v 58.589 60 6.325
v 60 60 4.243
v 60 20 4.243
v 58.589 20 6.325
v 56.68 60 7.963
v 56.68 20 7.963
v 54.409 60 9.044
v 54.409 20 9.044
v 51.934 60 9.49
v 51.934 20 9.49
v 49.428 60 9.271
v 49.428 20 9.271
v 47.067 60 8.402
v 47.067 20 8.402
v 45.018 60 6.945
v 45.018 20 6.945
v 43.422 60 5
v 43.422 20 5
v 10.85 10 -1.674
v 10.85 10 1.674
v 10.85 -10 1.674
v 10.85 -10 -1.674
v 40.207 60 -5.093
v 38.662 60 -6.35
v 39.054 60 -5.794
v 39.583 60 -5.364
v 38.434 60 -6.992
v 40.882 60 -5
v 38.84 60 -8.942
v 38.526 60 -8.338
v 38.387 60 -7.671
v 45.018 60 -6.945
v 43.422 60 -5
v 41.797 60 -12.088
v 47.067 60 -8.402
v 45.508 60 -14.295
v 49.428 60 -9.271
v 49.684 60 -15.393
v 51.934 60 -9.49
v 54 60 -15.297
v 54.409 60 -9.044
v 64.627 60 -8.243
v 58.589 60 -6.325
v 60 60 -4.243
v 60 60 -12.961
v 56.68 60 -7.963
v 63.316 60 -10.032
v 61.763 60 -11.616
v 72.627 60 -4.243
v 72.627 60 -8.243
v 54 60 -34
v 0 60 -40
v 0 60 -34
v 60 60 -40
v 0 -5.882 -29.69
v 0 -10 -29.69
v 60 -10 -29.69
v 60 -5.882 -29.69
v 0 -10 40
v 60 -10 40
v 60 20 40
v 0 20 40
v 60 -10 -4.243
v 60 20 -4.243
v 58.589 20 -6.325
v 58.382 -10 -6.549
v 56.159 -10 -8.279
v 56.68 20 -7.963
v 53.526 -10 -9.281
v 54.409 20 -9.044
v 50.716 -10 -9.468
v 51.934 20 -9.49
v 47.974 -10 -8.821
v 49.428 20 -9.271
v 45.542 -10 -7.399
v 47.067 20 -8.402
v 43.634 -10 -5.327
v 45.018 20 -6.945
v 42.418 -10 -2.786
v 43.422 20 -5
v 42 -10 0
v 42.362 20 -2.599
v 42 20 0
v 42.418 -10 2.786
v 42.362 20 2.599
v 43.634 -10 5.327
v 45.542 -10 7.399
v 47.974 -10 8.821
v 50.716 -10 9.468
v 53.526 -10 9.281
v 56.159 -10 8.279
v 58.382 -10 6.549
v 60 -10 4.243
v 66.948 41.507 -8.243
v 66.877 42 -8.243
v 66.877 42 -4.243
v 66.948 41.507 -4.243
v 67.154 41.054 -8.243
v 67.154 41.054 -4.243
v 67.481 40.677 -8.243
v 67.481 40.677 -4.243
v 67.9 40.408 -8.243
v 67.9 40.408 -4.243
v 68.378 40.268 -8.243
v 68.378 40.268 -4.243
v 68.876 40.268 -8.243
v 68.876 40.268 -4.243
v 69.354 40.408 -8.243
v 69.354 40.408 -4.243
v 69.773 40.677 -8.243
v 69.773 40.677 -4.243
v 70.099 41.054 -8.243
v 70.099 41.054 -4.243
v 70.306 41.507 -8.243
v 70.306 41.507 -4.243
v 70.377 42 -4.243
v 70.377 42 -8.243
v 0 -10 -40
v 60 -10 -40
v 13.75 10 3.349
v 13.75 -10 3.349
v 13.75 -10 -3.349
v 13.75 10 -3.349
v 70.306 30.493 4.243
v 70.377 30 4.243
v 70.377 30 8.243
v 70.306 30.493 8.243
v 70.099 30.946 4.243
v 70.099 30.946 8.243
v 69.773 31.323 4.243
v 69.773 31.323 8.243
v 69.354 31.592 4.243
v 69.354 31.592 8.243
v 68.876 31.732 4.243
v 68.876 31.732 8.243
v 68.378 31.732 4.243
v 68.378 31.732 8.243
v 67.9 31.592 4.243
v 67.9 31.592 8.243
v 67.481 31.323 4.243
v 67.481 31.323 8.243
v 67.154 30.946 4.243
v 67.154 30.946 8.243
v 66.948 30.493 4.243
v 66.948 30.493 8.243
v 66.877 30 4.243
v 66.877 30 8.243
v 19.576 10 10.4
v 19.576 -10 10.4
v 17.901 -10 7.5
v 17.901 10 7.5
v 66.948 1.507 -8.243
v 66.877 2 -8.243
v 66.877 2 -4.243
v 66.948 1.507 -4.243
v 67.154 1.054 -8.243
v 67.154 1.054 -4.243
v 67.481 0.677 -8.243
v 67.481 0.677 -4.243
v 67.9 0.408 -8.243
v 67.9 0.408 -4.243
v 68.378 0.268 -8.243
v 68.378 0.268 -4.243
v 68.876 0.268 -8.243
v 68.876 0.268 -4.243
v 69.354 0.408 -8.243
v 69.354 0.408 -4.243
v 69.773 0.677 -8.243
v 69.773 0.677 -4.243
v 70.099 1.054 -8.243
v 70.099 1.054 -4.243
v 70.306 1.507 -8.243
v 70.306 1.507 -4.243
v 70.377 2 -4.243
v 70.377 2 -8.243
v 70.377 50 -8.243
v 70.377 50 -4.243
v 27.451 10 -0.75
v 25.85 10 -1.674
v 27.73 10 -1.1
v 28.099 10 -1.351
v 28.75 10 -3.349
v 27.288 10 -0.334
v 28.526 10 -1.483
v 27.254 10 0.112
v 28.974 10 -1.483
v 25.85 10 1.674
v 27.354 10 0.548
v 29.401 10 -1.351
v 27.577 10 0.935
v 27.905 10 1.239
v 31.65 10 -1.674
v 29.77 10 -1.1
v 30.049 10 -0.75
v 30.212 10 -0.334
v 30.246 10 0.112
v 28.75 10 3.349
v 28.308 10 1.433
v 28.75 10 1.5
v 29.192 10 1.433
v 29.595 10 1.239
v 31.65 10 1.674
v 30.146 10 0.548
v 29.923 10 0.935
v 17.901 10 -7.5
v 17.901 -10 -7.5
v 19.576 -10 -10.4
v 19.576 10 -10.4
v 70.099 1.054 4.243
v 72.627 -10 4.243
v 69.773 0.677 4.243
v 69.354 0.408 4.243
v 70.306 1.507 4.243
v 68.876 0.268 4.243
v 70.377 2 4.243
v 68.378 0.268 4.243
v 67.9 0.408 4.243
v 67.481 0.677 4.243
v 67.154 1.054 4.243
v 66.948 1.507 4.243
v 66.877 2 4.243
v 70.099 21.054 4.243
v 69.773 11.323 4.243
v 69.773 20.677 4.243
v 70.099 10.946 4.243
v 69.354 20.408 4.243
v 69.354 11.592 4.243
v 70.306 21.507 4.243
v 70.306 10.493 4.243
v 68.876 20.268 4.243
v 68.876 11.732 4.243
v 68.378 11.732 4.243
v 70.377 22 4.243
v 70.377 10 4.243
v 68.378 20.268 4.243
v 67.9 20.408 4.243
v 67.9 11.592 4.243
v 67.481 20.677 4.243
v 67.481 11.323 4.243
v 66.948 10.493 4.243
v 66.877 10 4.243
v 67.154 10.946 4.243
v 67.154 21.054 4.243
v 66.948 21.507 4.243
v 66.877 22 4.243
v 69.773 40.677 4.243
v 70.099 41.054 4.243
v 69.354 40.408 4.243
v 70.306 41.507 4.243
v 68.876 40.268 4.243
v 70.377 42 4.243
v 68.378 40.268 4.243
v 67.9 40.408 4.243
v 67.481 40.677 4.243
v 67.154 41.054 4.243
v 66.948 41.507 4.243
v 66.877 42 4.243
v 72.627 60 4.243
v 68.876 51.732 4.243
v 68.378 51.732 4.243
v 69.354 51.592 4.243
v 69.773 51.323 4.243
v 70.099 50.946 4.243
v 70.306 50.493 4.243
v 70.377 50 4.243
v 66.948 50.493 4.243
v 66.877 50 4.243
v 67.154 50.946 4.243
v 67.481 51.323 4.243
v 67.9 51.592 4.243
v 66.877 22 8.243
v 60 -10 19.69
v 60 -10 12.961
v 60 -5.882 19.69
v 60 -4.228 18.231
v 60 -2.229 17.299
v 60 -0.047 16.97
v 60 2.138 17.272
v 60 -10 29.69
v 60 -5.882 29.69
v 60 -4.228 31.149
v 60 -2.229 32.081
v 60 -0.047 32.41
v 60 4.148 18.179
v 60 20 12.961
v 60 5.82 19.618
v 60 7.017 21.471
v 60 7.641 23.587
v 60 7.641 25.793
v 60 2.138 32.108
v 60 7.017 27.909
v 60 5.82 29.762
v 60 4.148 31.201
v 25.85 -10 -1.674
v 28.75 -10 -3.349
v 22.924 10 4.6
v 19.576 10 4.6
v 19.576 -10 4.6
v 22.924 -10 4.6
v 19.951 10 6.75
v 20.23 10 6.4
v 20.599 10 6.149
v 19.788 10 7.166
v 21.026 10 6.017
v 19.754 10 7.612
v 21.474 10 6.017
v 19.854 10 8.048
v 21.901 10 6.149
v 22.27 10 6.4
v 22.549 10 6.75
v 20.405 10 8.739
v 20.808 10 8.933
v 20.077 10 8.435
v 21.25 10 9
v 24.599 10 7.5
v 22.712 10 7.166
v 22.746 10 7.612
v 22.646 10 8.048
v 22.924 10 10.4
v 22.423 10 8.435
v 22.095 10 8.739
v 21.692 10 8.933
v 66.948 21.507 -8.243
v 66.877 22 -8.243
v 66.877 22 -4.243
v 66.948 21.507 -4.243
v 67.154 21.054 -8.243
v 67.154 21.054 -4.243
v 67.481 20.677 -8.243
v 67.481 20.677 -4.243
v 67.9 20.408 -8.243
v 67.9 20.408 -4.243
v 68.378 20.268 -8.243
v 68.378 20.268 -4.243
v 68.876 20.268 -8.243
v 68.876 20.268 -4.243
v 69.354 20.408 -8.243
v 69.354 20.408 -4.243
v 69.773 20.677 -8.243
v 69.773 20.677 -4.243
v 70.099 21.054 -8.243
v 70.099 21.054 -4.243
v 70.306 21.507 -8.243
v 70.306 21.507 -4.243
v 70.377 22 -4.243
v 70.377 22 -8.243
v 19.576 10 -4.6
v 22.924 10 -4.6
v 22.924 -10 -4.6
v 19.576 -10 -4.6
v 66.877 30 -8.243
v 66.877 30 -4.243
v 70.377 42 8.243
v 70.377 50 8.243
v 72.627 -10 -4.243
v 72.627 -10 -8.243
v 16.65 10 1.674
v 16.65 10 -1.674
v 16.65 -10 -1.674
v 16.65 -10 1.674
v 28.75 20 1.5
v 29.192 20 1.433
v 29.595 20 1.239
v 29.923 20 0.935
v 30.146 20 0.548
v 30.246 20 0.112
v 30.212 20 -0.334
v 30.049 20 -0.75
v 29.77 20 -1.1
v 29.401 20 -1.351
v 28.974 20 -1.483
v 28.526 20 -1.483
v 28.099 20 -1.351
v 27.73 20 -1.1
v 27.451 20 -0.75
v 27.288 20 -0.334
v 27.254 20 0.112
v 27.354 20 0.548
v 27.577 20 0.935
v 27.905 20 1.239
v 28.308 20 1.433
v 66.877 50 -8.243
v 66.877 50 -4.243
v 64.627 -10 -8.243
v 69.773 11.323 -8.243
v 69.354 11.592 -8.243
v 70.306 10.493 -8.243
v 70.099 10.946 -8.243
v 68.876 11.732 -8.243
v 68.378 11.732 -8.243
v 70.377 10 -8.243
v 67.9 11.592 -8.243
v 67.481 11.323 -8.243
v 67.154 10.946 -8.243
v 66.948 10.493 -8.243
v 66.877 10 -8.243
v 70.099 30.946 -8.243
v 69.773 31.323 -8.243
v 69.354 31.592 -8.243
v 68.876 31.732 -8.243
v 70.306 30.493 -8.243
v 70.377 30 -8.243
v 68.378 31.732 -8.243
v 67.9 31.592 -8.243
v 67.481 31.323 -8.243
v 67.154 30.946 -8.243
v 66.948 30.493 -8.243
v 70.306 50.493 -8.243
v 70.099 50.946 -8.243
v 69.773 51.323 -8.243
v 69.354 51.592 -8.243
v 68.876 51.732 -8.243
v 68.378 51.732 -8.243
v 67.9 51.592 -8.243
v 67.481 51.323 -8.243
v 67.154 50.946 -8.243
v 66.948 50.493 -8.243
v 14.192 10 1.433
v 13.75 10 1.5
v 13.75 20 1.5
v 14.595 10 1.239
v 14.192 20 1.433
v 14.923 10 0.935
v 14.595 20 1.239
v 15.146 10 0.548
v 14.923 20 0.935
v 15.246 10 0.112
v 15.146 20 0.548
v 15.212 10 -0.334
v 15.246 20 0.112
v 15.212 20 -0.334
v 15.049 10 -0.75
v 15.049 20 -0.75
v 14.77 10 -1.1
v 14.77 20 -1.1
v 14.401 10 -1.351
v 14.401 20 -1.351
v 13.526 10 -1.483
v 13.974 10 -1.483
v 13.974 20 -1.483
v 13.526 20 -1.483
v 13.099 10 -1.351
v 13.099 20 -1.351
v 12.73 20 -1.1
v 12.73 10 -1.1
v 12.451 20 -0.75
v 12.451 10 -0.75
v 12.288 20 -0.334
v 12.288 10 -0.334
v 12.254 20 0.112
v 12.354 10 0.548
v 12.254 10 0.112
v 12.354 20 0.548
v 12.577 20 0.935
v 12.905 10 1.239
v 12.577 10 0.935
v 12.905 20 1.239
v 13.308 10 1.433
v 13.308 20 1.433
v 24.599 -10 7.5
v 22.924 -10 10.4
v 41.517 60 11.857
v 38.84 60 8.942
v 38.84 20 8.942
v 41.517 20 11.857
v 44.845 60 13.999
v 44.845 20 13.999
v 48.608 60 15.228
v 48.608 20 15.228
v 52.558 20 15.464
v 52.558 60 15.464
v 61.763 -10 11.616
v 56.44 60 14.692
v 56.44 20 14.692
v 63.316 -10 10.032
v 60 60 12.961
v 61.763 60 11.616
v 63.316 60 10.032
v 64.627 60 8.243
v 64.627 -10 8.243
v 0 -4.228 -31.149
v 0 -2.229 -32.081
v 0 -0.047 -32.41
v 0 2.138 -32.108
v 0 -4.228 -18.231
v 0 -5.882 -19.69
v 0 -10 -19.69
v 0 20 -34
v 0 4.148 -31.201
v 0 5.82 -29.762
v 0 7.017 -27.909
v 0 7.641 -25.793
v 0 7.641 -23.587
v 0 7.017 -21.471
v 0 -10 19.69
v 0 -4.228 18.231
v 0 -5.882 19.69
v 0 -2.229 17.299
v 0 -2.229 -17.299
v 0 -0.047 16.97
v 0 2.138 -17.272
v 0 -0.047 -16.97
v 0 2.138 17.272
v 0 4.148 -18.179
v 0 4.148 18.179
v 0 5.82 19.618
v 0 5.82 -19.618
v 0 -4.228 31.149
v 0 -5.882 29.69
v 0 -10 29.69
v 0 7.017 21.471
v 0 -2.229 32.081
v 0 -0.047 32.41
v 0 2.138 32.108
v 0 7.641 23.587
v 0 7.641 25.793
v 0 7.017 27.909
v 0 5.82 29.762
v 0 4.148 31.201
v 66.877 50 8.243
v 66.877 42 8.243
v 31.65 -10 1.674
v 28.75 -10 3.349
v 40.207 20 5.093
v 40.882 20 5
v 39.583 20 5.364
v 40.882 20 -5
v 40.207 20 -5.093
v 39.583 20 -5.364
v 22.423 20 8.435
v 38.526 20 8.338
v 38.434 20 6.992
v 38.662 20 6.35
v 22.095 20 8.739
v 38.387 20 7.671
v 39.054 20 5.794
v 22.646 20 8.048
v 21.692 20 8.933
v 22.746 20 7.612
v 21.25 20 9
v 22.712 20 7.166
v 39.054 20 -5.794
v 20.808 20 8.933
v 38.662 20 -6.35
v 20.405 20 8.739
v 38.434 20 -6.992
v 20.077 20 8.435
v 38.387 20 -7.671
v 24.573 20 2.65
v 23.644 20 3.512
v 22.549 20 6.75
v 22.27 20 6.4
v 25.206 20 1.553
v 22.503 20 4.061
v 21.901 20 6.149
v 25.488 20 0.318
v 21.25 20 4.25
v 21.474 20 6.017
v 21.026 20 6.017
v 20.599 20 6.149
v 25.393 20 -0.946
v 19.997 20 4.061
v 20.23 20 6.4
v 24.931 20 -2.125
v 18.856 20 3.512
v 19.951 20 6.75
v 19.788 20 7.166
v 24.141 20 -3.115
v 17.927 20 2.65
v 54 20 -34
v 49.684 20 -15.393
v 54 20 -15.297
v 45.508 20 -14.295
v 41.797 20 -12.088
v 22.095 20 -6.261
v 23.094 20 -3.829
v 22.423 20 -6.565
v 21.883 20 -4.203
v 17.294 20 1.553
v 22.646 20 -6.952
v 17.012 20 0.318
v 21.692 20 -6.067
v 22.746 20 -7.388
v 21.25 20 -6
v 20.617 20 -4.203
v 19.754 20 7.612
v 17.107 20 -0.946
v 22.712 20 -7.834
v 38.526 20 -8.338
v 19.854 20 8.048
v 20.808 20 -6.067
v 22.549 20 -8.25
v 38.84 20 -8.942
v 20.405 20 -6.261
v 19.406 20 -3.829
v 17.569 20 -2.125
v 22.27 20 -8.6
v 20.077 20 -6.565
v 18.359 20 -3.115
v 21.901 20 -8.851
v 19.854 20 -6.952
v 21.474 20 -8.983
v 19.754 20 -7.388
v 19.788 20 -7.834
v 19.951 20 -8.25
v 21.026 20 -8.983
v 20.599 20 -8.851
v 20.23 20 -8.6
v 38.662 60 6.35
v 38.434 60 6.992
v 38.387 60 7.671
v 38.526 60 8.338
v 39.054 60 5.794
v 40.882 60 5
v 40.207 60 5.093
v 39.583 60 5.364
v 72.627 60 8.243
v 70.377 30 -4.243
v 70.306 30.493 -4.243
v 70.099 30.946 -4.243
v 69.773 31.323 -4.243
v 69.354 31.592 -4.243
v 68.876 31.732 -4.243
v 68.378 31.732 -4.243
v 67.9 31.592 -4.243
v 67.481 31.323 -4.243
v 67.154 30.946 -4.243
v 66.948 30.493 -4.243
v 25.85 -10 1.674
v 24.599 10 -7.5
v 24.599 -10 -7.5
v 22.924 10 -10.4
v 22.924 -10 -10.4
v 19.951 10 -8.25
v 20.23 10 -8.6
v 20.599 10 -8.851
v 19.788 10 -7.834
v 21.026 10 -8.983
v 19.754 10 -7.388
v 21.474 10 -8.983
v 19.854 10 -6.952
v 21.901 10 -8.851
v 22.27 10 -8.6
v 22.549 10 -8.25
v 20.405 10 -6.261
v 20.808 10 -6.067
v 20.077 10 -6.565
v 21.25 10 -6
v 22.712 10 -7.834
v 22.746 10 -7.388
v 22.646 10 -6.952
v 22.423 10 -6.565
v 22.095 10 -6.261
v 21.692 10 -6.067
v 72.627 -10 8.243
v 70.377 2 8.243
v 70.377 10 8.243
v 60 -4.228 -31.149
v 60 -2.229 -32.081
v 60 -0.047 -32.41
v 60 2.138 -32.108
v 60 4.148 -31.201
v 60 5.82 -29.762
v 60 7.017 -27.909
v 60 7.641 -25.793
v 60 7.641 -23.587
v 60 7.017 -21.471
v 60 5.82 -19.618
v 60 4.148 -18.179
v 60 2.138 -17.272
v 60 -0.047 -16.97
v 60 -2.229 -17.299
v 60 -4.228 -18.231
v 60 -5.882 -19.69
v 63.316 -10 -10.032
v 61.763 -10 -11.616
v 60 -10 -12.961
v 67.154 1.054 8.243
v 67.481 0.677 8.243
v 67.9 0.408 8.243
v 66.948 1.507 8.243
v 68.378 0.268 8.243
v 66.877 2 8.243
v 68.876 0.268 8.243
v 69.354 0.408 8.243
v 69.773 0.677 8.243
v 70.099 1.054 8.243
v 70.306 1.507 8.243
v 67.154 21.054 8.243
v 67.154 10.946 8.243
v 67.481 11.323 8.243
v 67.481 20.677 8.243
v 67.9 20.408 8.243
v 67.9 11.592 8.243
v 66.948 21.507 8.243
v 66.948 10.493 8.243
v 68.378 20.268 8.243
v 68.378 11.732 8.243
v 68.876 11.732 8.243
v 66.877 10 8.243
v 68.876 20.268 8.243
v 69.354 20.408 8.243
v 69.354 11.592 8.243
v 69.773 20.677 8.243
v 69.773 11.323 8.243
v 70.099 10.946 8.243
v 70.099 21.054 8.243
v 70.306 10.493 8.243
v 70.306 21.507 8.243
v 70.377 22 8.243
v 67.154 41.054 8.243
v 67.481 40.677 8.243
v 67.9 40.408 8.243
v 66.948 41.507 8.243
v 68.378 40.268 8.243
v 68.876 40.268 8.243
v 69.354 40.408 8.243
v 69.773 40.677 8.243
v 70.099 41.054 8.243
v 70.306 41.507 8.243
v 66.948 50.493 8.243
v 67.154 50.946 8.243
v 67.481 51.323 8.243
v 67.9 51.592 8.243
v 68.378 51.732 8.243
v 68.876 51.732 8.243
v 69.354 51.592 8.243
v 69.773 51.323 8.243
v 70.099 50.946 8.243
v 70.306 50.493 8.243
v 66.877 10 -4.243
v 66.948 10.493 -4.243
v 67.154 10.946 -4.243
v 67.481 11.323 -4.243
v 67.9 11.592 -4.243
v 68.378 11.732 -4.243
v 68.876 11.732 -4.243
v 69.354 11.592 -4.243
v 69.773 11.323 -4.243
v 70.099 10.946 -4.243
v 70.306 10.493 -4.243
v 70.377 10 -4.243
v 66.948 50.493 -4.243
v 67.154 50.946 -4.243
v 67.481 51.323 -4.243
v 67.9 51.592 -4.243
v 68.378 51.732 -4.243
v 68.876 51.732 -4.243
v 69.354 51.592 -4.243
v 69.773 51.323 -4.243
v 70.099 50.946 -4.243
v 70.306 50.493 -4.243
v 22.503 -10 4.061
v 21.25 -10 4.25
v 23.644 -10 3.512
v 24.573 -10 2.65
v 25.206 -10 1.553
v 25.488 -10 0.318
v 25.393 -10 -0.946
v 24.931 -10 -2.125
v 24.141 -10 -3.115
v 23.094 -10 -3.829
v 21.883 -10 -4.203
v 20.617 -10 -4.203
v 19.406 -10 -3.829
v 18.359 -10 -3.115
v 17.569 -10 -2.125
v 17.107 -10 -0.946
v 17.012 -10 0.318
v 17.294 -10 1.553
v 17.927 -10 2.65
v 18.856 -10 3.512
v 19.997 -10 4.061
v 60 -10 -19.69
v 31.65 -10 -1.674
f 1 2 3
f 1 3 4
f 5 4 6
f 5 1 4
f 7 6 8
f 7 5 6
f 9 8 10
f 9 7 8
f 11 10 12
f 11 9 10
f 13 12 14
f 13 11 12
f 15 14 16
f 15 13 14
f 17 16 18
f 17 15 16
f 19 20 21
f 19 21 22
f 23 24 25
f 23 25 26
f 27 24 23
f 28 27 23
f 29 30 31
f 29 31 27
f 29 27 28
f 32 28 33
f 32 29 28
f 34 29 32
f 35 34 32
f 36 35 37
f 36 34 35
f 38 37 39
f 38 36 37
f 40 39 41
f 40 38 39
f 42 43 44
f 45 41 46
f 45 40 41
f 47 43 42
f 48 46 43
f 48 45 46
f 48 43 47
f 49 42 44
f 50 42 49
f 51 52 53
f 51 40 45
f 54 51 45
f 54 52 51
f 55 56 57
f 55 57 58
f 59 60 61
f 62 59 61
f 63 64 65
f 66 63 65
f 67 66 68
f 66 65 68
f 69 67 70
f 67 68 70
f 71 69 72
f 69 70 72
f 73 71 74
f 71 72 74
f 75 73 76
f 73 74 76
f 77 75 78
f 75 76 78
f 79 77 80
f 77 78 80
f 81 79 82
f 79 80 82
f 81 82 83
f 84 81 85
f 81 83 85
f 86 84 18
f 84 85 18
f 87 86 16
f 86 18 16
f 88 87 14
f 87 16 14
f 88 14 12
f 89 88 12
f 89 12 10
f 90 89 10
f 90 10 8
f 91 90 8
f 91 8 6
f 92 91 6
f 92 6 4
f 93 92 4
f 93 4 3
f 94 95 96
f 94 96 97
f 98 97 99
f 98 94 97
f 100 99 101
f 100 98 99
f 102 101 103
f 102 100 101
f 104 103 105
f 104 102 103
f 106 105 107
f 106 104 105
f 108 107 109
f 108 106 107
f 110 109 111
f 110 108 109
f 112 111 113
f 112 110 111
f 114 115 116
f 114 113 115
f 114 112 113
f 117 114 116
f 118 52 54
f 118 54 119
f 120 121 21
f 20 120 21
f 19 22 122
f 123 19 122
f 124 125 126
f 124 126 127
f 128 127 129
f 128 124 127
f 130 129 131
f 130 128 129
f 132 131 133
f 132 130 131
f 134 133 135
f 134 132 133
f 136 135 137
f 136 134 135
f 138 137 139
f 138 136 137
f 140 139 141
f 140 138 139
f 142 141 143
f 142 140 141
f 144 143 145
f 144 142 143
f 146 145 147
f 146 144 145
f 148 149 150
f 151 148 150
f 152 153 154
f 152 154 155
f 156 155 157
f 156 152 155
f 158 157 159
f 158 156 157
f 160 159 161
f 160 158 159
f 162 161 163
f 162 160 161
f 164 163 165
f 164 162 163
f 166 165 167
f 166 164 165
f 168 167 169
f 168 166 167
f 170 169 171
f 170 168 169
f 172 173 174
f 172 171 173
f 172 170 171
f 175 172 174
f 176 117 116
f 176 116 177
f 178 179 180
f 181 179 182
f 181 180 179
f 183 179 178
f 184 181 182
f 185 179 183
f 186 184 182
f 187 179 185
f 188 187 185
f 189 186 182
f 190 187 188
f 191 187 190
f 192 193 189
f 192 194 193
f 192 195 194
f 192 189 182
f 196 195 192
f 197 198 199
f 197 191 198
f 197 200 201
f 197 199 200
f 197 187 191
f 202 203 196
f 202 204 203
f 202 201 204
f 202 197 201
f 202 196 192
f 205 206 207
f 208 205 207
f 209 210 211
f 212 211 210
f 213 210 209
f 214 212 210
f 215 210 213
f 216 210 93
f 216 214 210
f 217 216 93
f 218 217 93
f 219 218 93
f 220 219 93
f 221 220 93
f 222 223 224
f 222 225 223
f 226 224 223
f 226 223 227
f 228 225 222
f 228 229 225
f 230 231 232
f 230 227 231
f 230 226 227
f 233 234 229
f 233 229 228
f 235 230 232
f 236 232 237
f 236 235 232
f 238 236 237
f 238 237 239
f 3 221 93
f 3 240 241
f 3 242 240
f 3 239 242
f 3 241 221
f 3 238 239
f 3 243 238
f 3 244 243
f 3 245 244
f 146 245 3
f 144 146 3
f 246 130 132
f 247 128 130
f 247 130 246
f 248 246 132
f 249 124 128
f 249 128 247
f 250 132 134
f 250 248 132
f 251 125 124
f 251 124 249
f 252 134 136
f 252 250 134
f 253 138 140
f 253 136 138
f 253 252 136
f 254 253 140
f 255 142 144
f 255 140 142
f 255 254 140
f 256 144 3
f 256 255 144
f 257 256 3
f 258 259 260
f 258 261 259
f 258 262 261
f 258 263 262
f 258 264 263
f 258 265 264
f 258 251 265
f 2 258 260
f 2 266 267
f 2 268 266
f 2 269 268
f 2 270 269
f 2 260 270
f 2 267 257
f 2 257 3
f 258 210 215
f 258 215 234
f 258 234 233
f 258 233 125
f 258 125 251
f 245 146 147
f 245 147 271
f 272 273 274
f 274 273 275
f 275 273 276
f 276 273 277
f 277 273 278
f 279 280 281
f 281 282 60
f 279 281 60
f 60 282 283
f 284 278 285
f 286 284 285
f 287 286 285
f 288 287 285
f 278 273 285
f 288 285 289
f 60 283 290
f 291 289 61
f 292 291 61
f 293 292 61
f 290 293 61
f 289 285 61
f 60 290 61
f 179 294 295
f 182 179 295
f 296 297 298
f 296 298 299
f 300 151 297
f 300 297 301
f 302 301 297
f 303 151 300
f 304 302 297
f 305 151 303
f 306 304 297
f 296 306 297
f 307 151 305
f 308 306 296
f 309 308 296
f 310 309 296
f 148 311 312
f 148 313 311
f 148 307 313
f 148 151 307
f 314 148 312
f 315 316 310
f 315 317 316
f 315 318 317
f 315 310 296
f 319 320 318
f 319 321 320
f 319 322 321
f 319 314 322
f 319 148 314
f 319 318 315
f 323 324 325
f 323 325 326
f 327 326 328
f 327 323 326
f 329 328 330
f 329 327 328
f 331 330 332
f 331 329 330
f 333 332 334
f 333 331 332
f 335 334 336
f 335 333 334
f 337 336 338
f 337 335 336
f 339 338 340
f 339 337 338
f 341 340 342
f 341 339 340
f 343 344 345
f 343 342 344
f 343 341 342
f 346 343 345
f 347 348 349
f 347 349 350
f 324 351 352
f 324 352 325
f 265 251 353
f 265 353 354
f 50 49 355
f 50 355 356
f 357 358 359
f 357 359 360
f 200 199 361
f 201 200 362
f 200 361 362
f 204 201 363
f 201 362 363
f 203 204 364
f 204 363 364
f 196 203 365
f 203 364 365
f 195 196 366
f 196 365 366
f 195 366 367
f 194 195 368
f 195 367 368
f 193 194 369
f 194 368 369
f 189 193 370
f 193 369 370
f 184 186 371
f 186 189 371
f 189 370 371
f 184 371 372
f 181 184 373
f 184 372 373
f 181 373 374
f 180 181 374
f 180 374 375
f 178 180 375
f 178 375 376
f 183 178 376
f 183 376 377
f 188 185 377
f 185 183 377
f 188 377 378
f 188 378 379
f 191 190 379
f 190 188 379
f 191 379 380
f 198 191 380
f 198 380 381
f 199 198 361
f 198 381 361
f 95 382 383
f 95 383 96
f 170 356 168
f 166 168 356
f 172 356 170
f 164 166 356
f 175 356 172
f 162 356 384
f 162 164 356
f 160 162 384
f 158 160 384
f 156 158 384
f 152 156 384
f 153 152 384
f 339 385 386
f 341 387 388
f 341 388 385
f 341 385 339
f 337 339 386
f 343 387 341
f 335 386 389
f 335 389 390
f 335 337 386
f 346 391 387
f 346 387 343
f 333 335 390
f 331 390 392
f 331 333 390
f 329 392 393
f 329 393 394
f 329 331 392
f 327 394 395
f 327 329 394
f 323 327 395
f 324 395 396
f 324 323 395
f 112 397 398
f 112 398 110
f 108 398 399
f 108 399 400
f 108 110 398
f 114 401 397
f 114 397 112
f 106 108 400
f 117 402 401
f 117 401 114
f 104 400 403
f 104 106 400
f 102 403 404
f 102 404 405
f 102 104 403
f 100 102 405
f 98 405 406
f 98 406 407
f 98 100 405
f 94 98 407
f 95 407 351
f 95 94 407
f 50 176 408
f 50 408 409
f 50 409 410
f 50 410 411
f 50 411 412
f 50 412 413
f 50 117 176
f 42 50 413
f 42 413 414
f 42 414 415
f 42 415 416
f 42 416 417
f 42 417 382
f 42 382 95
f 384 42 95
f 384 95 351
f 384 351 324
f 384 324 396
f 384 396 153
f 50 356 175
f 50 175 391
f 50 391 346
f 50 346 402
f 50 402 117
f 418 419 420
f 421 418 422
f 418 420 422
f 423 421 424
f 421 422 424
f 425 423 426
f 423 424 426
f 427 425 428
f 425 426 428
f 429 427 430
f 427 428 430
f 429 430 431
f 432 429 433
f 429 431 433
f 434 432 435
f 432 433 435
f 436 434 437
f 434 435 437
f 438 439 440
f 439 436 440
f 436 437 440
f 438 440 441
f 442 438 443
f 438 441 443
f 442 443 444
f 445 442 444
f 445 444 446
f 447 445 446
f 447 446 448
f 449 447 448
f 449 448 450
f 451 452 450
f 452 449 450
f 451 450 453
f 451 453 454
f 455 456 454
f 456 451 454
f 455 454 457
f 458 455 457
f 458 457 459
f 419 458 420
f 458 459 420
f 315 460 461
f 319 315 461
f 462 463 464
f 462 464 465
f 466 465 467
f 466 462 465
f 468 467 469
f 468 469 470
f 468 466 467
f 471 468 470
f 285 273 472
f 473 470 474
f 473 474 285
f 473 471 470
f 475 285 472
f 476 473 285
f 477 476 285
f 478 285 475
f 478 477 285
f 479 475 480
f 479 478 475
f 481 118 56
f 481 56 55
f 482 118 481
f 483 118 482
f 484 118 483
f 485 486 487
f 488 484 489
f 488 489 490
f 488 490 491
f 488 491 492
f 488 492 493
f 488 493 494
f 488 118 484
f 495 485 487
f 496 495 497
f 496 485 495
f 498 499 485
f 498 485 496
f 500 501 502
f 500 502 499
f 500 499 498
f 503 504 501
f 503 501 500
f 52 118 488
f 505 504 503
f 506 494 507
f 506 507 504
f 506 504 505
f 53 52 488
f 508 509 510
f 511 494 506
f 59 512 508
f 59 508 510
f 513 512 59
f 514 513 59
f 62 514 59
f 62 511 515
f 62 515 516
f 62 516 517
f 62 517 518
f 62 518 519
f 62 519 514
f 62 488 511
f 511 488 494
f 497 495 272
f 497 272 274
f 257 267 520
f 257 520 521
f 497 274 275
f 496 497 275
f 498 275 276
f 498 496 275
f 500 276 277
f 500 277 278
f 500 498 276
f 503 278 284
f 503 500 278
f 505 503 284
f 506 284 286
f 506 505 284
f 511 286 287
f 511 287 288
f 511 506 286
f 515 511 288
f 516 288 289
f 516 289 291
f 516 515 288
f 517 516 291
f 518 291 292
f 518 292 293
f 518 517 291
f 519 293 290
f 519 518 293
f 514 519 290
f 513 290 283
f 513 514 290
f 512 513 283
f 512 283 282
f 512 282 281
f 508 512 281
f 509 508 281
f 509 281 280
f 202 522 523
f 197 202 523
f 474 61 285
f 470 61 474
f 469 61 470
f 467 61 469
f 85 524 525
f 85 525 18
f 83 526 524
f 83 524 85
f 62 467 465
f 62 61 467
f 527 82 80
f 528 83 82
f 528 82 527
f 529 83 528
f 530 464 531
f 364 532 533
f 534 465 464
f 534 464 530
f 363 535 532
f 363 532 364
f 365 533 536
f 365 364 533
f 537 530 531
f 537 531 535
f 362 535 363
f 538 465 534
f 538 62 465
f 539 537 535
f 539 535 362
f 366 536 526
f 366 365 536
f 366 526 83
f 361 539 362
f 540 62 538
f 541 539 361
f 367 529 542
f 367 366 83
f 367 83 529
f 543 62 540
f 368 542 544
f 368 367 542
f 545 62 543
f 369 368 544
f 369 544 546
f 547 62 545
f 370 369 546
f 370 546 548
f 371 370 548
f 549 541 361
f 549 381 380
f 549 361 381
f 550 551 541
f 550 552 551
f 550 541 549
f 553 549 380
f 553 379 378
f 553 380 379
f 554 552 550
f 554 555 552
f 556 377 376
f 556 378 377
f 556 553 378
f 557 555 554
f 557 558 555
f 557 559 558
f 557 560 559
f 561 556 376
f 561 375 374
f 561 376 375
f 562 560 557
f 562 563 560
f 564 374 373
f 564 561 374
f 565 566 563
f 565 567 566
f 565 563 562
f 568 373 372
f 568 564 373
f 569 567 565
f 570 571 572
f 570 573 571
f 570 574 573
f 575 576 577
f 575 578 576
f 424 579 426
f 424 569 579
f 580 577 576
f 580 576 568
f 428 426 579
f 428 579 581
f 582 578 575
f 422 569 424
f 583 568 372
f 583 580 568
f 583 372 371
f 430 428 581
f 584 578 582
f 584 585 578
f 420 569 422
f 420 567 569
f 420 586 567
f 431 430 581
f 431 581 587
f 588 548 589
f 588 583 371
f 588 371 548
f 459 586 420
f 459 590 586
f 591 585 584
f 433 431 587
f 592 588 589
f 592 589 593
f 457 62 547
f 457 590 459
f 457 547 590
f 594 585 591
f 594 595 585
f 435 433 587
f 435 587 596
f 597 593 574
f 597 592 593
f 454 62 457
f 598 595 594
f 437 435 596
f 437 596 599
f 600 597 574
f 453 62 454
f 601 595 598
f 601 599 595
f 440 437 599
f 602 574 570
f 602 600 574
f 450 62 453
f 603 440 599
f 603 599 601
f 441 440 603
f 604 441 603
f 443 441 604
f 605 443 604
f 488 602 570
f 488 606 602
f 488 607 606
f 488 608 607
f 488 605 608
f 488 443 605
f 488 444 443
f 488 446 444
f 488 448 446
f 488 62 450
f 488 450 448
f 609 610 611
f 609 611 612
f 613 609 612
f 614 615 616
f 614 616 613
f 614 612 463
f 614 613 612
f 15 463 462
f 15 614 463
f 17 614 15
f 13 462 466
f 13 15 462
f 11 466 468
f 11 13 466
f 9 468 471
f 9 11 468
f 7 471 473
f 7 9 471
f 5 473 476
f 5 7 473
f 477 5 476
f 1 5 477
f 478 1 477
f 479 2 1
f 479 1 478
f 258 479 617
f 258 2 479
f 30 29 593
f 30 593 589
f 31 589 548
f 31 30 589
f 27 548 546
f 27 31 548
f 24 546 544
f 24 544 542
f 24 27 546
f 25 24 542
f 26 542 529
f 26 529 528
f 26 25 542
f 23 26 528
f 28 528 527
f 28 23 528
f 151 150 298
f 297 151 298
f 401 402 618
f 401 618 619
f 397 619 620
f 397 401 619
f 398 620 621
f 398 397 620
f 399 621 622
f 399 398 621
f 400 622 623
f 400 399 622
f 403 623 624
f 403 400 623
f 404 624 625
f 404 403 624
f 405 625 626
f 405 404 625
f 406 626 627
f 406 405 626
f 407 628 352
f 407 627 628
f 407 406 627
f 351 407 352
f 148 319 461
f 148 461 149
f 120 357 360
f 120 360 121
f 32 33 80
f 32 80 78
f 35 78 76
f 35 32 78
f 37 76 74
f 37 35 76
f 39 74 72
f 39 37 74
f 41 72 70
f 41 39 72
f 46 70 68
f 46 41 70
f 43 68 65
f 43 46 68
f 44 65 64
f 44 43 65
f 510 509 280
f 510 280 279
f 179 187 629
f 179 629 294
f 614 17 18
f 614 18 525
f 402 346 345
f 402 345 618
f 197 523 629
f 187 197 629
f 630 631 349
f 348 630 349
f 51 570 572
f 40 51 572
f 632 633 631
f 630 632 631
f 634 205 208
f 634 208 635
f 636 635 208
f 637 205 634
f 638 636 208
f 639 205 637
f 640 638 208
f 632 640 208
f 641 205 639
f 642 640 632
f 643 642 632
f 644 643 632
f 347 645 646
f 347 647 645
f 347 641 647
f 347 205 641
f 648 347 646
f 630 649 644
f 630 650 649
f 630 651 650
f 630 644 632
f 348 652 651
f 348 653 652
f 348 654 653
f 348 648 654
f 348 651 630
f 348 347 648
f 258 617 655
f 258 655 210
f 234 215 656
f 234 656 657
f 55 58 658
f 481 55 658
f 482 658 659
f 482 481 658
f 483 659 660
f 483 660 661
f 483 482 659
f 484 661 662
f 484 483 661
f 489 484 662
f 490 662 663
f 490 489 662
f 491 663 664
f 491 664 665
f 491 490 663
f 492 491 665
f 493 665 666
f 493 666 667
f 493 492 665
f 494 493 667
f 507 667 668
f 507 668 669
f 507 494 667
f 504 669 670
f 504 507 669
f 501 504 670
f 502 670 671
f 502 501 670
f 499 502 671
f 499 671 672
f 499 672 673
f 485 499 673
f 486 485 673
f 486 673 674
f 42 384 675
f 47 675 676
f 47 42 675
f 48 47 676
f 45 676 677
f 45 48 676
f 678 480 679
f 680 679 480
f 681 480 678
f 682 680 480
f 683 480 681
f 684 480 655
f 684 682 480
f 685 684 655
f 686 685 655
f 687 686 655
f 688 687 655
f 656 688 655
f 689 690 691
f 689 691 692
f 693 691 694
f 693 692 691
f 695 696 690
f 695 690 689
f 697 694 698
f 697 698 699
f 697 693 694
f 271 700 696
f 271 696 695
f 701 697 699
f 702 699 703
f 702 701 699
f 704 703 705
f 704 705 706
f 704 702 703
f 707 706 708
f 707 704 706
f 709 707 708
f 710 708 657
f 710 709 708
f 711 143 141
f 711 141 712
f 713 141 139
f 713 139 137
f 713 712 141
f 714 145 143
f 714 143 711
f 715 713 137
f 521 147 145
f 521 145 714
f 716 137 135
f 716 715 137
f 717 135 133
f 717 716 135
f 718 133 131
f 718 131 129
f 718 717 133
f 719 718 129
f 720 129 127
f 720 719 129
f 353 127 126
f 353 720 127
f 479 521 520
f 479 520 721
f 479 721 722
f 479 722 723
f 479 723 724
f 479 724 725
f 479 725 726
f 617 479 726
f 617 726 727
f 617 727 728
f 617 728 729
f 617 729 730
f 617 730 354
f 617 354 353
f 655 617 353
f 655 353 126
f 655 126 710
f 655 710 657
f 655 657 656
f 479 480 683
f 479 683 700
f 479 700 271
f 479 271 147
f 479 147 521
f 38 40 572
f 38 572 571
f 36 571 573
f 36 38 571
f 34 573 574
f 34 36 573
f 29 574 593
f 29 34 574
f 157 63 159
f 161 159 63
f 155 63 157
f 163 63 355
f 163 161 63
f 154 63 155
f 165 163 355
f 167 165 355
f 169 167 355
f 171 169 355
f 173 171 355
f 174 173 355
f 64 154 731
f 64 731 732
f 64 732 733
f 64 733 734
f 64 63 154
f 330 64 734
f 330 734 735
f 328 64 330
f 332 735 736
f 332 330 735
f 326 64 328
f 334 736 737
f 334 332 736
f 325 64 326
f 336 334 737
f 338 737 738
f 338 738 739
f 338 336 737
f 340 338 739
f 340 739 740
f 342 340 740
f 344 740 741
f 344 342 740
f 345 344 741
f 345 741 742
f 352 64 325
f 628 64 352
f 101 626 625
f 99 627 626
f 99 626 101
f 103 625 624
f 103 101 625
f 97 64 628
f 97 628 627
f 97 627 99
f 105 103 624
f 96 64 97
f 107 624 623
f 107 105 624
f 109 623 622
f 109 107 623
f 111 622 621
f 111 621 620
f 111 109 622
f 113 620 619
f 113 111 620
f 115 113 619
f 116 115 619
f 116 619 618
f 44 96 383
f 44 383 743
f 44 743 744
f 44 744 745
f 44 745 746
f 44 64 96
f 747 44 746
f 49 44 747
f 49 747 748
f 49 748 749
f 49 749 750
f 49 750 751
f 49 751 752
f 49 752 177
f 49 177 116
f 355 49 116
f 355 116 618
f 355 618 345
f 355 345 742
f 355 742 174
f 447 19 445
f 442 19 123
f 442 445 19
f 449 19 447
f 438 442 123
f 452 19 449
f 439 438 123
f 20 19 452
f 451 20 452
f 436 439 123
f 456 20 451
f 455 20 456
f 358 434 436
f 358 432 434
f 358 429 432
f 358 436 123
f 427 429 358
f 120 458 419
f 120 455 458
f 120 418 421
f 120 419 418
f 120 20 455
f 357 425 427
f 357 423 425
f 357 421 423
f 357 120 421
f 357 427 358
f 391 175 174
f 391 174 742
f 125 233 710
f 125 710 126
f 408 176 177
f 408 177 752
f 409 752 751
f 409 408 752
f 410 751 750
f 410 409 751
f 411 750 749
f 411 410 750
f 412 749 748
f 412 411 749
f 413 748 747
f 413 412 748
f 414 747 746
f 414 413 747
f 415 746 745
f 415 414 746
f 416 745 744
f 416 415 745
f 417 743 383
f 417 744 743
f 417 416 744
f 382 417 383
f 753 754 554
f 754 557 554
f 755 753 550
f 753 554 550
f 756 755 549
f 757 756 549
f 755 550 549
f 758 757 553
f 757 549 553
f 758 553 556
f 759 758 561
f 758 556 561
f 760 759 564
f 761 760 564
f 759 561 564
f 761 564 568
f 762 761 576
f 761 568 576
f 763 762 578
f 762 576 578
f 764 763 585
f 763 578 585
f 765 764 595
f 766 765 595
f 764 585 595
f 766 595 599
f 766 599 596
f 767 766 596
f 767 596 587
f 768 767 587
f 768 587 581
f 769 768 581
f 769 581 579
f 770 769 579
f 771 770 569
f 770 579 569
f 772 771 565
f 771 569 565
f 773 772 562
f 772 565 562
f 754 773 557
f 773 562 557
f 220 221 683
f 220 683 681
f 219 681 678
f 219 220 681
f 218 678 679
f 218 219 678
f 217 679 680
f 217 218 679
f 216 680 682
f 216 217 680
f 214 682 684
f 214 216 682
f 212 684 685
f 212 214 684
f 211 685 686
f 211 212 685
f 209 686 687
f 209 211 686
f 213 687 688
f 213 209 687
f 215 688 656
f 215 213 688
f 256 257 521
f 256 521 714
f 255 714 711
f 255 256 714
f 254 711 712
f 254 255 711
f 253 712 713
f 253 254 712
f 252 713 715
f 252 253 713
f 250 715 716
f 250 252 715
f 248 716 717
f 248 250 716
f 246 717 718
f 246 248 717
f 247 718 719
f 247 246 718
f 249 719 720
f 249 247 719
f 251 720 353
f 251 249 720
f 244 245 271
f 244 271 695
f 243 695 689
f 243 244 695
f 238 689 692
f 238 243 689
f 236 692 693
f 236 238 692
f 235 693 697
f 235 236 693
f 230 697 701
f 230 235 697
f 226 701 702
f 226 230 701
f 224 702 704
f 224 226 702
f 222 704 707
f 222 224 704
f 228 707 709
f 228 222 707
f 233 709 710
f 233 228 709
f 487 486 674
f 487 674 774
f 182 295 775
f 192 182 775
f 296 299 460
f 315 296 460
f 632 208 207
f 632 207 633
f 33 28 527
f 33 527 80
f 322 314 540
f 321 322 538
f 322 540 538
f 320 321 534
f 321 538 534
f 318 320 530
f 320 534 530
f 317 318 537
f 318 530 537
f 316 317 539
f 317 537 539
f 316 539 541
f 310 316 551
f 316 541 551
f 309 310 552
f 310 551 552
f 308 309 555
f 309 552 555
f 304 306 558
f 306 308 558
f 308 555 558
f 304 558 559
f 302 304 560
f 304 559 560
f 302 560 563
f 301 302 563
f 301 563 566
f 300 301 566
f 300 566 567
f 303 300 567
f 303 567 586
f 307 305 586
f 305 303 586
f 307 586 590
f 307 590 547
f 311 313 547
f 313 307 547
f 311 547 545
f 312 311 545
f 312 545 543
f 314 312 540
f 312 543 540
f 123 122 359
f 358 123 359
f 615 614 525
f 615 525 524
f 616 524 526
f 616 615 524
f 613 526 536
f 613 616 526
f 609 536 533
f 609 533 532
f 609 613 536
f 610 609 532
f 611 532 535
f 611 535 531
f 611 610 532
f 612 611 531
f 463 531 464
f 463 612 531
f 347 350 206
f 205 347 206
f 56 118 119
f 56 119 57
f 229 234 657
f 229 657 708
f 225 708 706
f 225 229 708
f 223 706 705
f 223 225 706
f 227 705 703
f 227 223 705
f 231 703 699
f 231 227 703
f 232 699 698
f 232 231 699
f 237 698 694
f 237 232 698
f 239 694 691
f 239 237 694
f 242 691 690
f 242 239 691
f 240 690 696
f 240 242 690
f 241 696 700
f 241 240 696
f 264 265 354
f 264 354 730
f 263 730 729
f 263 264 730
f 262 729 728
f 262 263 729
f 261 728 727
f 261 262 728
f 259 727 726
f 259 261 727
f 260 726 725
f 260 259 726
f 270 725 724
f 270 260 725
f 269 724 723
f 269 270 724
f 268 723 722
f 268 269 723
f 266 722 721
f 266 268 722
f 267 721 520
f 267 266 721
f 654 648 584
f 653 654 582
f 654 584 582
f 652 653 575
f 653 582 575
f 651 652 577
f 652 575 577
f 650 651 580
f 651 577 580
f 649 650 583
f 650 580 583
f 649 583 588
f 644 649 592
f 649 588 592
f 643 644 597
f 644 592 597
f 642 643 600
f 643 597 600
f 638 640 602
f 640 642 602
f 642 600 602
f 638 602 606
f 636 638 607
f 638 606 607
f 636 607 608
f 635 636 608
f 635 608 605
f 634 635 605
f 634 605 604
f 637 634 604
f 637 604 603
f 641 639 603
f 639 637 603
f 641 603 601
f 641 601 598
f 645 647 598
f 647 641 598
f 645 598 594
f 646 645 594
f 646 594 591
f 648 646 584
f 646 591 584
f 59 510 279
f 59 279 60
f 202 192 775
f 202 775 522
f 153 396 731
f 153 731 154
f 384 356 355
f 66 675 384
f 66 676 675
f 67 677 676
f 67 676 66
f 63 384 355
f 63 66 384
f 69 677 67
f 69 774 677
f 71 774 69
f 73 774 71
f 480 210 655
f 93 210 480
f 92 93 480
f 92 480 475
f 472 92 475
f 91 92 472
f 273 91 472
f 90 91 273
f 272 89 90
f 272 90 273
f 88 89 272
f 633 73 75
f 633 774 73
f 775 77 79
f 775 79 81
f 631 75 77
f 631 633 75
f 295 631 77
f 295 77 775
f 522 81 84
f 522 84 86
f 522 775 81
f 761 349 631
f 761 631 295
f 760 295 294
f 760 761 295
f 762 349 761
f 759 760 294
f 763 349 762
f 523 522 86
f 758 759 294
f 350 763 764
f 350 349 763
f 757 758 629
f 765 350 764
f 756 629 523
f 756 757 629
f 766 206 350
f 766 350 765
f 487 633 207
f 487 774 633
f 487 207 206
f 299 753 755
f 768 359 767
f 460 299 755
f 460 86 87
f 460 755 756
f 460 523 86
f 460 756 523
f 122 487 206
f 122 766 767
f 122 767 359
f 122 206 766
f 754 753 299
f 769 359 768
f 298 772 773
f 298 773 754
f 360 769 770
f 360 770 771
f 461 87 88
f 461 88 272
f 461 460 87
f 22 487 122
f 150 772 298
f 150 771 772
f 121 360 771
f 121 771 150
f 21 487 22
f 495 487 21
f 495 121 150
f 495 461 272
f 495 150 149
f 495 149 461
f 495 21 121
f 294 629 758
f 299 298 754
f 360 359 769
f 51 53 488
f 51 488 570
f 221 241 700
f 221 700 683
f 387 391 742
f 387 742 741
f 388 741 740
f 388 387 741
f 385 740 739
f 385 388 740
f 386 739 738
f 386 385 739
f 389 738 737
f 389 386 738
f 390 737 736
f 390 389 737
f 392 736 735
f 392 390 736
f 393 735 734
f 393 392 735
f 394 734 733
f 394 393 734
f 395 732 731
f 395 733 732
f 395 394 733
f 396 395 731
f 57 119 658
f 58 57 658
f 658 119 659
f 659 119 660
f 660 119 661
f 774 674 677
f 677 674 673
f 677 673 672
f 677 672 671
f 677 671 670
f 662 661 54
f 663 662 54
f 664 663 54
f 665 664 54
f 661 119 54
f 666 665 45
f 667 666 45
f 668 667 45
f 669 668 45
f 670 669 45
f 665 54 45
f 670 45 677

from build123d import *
from build123d.topology import SkipClean

# Parameters (mm, degrees)
MAIN_BASE_DEPTH                 = 60
HOLES_SKETCH_R                  = 4.25
HOLES_SKETCH_R_2                = 1.5
HOLES_SKETCH_R_3                = 9.5
HOLES_DEPTH                     = 30
BOSS_EXTRUDE3_START             = 40
BOSS_EXTRUDE3_DEPTH             = 40
BOSS_EXTRUDE4_REACH             = 84.462
BOSS_EXTRUDE4_DIRECTION_2_REACH = 84.462
CUT_EXTRUDE2_START              = -20
SKETCH4_R                       = 4.25
SKETCH4_R_2                     = 1.5
CUT_EXTRUDE2_DEPTH              = 20
CUT_EXTRUDE3_REACH              = 107.839


with BuildPart() as part:
    # Sketch1 → Main Base (new body)
    with BuildSketch(Plane(origin=(0, 0, 0), x_dir=(0, 0, -1), z_dir=(1, 0, 0))):
        with BuildLine():
            Line((-40, 20), (40, 20))
            Line((40, 20), (40, -10))
            Line((40, -10), (29.69, -10))
            Line((29.69, -10), (29.69, -5.882040462))
            ThreePointArc((29.69, -5.882040462), (24.69, 7.72), (19.69, -5.882040462))
            Line((19.69, -5.882040462), (19.69, -10))
            Line((19.69, -10), (-19.69, -10))
            Line((-19.69, -10), (-19.69, -5.882040462))
            ThreePointArc((-19.69, -5.882040462), (-24.69, 7.72), (-29.69, -5.882040462))
            Line((-29.69, -5.882040462), (-29.69, -10))
            Line((-29.69, -10), (-40, -10))
            Line((-40, -10), (-40, 20))
        make_face()
    extrude(amount=MAIN_BASE_DEPTH)

    # Holes_Sketch → Holes (cut)
    with BuildSketch(Plane(origin=(0, 20, 0), x_dir=(1, 0, 0), z_dir=(0, 1, 0))):
        with Locations(Location((21.25, 0, 0), (0, 0, 270))):
            Circle(HOLES_SKETCH_R)
        with Locations(Location((21.25, -7.5, 0), (0, 0, 270))):
            Circle(HOLES_SKETCH_R_2)
        with Locations(Location((13.75, 0, 0), (0, 0, 270))):
            Circle(HOLES_SKETCH_R_2)
        with Locations(Location((28.75, 0, 0), (0, 0, 270))):
            Circle(HOLES_SKETCH_R_2)
        with Locations(Location((21.25, 7.5, 0), (0, 0, 270))):
            Circle(HOLES_SKETCH_R_2)
        with Locations((51.5, 0)):
            Circle(HOLES_SKETCH_R_3)
    extrude(amount=-HOLES_DEPTH, mode=Mode.SUBTRACT)

    # Sketch3 → Boss-Extrude3 (add)
    with SkipClean():  # the faces are left unmerged after this step: merging them gives an invalid solid
        with BuildSketch(Plane(origin=(0, 20, 0), x_dir=(1, 0, 0), z_dir=(0, 1, 0)).offset(BOSS_EXTRUDE3_START)):
            with BuildLine():
                ThreePointArc((38.839623499, -8.942307692), (48.607661418, -15.227750245), (60, -12.961481397))
                Line((60, -12.961481397), (60, -7.5))
                Line((60, -7.5), (60, -4.242640687))
                ThreePointArc((60, -4.242640687), (51.933558112, -9.490101547), (43.422252789, -5))
                Line((43.422252789, -5), (40.881619709, -5))
                ThreePointArc((40.881619709, -5), (38.66173579, -6.350167236), (38.839623499, -8.942307692))
            make_face()
            with BuildLine():
                ThreePointArc((60, 12.961481397), (57.122608838, 14.444246946), (54, 15.297058541))
                ThreePointArc((54, 15.297058541), (45.508003067, 14.294963195), (38.839623499, 8.942307692))
                ThreePointArc((38.839623499, 8.942307692), (38.66173579, 6.350167236), (40.881619709, 5))
                Line((40.881619709, 5), (43.422252789, 5))
                ThreePointArc((43.422252789, 5), (51.933558112, 9.490101547), (60, 4.242640687))
                Line((60, 4.242640687), (60, 7.5))
                Line((60, 7.5), (60, 12.961481397))
            make_face()
            with BuildLine():
                Line((60, 34), (54, 34))
                Line((54, 34), (54, 15.297058541))
                ThreePointArc((54, 15.297058541), (57.122608838, 14.444246946), (60, 12.961481397))
                Line((60, 12.961481397), (60, 34))
            make_face()
            Polygon((0, 40), (0, 34), (54, 34), (60, 34), (60, 40), align=None)
        extrude(amount=-BOSS_EXTRUDE3_DEPTH)

    # Boss-Extrude4: up to this face of the body (flat: up to its plane)
    boss_extrude4_end = Plane(part.part.faces().sort_by_distance((49.565869061, 60, 10.678132871))[0])
    # Sketch3<6> → Boss-Extrude4 (add, up to the picked face)
    with BuildSketch(Plane(origin=(0, 20, 0), x_dir=(1, 0, 0), z_dir=(0, 1, 0)), mode=Mode.PRIVATE) as boss_extrude4_sk1:
        with BuildLine():
            Line((60, -7.5), (60, -12.961481397))
            ThreePointArc((60, -12.961481397), (62.567738473, -10.8515052), (64.626647497, -8.242640687))
            Line((64.626647497, -8.242640687), (72.626647497, -8.242640687))
            Line((72.626647497, -8.242640687), (72.626647497, -4.242640687))
            Line((72.626647497, -4.242640687), (60, -4.242640687))
            Line((60, -4.242640687), (60, -7.5))
        make_face()
    boss_extrude4_tool1 = split(extrude(boss_extrude4_sk1.sketch, amount=BOSS_EXTRUDE4_REACH, mode=Mode.PRIVATE), bisect_by=boss_extrude4_end, keep=Keep.BOTH, mode=Mode.PRIVATE)
    # Sketch3<6> → Boss-Extrude4 (add, up to the picked face)
    with BuildSketch(Plane(origin=(0, 20, 0), x_dir=(1, 0, 0), z_dir=(0, 1, 0)), mode=Mode.PRIVATE) as boss_extrude4_sk2:
        with BuildLine():
            ThreePointArc((64.626647497, 8.242640687), (62.567738473, 10.8515052), (60, 12.961481397))
            Line((60, 12.961481397), (60, 7.5))
            Line((60, 7.5), (60, 4.242640687))
            Line((60, 4.242640687), (72.626647497, 4.242640687))
            Line((72.626647497, 4.242640687), (72.626647497, 8.242640687))
            Line((72.626647497, 8.242640687), (64.626647497, 8.242640687))
        make_face()
    boss_extrude4_tool2 = split(extrude(boss_extrude4_sk2.sketch, amount=BOSS_EXTRUDE4_REACH, mode=Mode.PRIVATE), bisect_by=boss_extrude4_end, keep=Keep.BOTH, mode=Mode.PRIVATE)
    add(boss_extrude4_tool1.solids().sort_by(Axis((65.389209, 20, 6.97315), (0, 1, 0)))[0])
    add(boss_extrude4_tool2.solids().sort_by(Axis((65.389209, 20, -6.97315), (0, 1, 0)))[0])

    # Boss-Extrude4 direction 2: up to this face of the body (flat: up to its plane)
    boss_extrude4_direction_2_end = Plane(part.part.faces().sort_by_distance((0.717689654, -10, 0))[0])
    # Sketch3<6> → Boss-Extrude4 direction 2 (add, up to the picked face)
    with BuildSketch(Plane(origin=(0, 20, 0), x_dir=(1, 0, 0), z_dir=(0, 1, 0)), mode=Mode.PRIVATE) as boss_extrude4_direction_2_sk1:
        with BuildLine():
            Line((60, -7.5), (60, -12.961481397))
            ThreePointArc((60, -12.961481397), (62.567738473, -10.8515052), (64.626647497, -8.242640687))
            Line((64.626647497, -8.242640687), (72.626647497, -8.242640687))
            Line((72.626647497, -8.242640687), (72.626647497, -4.242640687))
            Line((72.626647497, -4.242640687), (60, -4.242640687))
            Line((60, -4.242640687), (60, -7.5))
        make_face()
    boss_extrude4_direction_2_tool1 = split(extrude(boss_extrude4_direction_2_sk1.sketch, amount=-BOSS_EXTRUDE4_DIRECTION_2_REACH, mode=Mode.PRIVATE), bisect_by=boss_extrude4_direction_2_end, keep=Keep.BOTH, mode=Mode.PRIVATE)
    # Sketch3<6> → Boss-Extrude4 direction 2 (add, up to the picked face)
    with BuildSketch(Plane(origin=(0, 20, 0), x_dir=(1, 0, 0), z_dir=(0, 1, 0)), mode=Mode.PRIVATE) as boss_extrude4_direction_2_sk2:
        with BuildLine():
            ThreePointArc((64.626647497, 8.242640687), (62.567738473, 10.8515052), (60, 12.961481397))
            Line((60, 12.961481397), (60, 7.5))
            Line((60, 7.5), (60, 4.242640687))
            Line((60, 4.242640687), (72.626647497, 4.242640687))
            Line((72.626647497, 4.242640687), (72.626647497, 8.242640687))
            Line((72.626647497, 8.242640687), (64.626647497, 8.242640687))
        make_face()
    boss_extrude4_direction_2_tool2 = split(extrude(boss_extrude4_direction_2_sk2.sketch, amount=-BOSS_EXTRUDE4_DIRECTION_2_REACH, mode=Mode.PRIVATE), bisect_by=boss_extrude4_direction_2_end, keep=Keep.BOTH, mode=Mode.PRIVATE)
    add(boss_extrude4_direction_2_tool1.solids().sort_by(Axis((65.389209, 20, 6.97315), (0, -1, 0)))[0])
    add(boss_extrude4_direction_2_tool2.solids().sort_by(Axis((65.389209, 20, -6.97315), (0, -1, 0)))[0])

    # Sketch4 → Cut-Extrude2 (cut)
    # profile 1 of 5: a face of its own
    with SkipClean():  # the faces are left unmerged after this step: merging them gives an invalid solid
        with BuildSketch(Plane.XZ.offset(10).offset(CUT_EXTRUDE2_START)):
            with Locations(Location((21.25, 0, 0), (0, 0, 90))):
                Circle(SKETCH4_R)
        # profile 2 of 5: a face of its own
        with BuildSketch(Plane.XZ.offset(10).offset(CUT_EXTRUDE2_START)):
            Polygon((31.65, 1.674315781), (28.75, 3.348631561), (25.85, 1.674315781), (25.85, -1.674315781), (28.75, -3.348631561), (31.65, -1.674315781), align=None)
            with Locations(Location((28.75, 0, 0), (0, 0, 90))):
                Circle(SKETCH4_R_2, mode=Mode.SUBTRACT)
        # profile 3 of 5: a face of its own
        with BuildSketch(Plane.XZ.offset(10).offset(CUT_EXTRUDE2_START)):
            Polygon((22.924315781, 4.6), (24.598631561, 7.5), (22.924315781, 10.4), (19.575684219, 10.4), (17.901368439, 7.5), (19.575684219, 4.6), align=None)
            with Locations(Location((21.25, 7.5, 0), (0, 0, 90))):
                Circle(SKETCH4_R_2, mode=Mode.SUBTRACT)
        # profile 4 of 5: a face of its own
        with BuildSketch(Plane.XZ.offset(10).offset(CUT_EXTRUDE2_START)):
            Polygon((22.924315781, -10.4), (24.598631561, -7.5), (22.924315781, -4.6), (19.575684219, -4.6), (17.901368439, -7.5), (19.575684219, -10.4), align=None)
            with Locations(Location((21.25, -7.5, 0), (0, 0, 90))):
                Circle(SKETCH4_R_2, mode=Mode.SUBTRACT)
        # profile 5 of 5: a face of its own
        with BuildSketch(Plane.XZ.offset(10).offset(CUT_EXTRUDE2_START)):
            Polygon((10.85, -1.674315781), (13.75, -3.348631561), (16.65, -1.674315781), (16.65, 1.674315781), (13.75, 3.348631561), (10.85, 1.674315781), align=None)
            with Locations(Location((13.75, 0, 0), (0, 0, 90))):
                Circle(SKETCH4_R_2, mode=Mode.SUBTRACT)
        extrude(amount=CUT_EXTRUDE2_DEPTH, mode=Mode.SUBTRACT)

    # Cut-Extrude3: up to this face of the body (flat: up to its plane)
    cut_extrude3_end = Plane(part.part.faces().sort_by_distance((68.626647497, 40, 8.242640687))[0])
    # Sketch7 → Cut-Extrude3 (cut, up to the picked face)
    with BuildSketch(Plane(origin=(0, 0, -8.242640687), x_dir=(-1, 0, 0), z_dir=(0, 0, -1)), mode=Mode.PRIVATE) as cut_extrude3_sk1:
        with BuildLine():
            Line((-66.876647497, 50), (-66.876647497, 42))
            ThreePointArc((-66.876647497, 42), (-68.626647497, 40.25), (-70.376647497, 42))
            Line((-70.376647497, 42), (-70.376647497, 50))
            ThreePointArc((-70.376647497, 50), (-68.626647497, 51.75), (-66.876647497, 50))
        make_face()
    cut_extrude3_tool1 = split(extrude(cut_extrude3_sk1.sketch, amount=-CUT_EXTRUDE3_REACH, mode=Mode.PRIVATE), bisect_by=cut_extrude3_end, keep=Keep.BOTH, mode=Mode.PRIVATE)
    # Sketch7 → Cut-Extrude3 (cut, up to the picked face)
    with BuildSketch(Plane(origin=(0, 0, -8.242640687), x_dir=(-1, 0, 0), z_dir=(0, 0, -1)), mode=Mode.PRIVATE) as cut_extrude3_sk2:
        with BuildLine():
            Line((-66.876647497, 30), (-66.876647497, 22))
            ThreePointArc((-66.876647497, 22), (-68.626647497, 20.25), (-70.376647497, 22))
            Line((-70.376647497, 22), (-70.376647497, 30))
            ThreePointArc((-70.376647497, 30), (-68.626647497, 31.75), (-66.876647497, 30))
        make_face()
    cut_extrude3_tool2 = split(extrude(cut_extrude3_sk2.sketch, amount=-CUT_EXTRUDE3_REACH, mode=Mode.PRIVATE), bisect_by=cut_extrude3_end, keep=Keep.BOTH, mode=Mode.PRIVATE)
    # Sketch7 → Cut-Extrude3 (cut, up to the picked face)
    with BuildSketch(Plane(origin=(0, 0, -8.242640687), x_dir=(-1, 0, 0), z_dir=(0, 0, -1)), mode=Mode.PRIVATE) as cut_extrude3_sk3:
        with BuildLine():
            Line((-66.876647497, 10), (-66.876647497, 2))
            ThreePointArc((-66.876647497, 2), (-68.626647497, 0.25), (-70.376647497, 2))
            Line((-70.376647497, 2), (-70.376647497, 10))
            ThreePointArc((-70.376647497, 10), (-68.626647497, 11.75), (-66.876647497, 10))
        make_face()
    cut_extrude3_tool3 = split(extrude(cut_extrude3_sk3.sketch, amount=-CUT_EXTRUDE3_REACH, mode=Mode.PRIVATE), bisect_by=cut_extrude3_end, keep=Keep.BOTH, mode=Mode.PRIVATE)
    add(cut_extrude3_tool1.solids().sort_by(Axis((68.626647, 46, -8.242641), (0, 0, 1)))[0], mode=Mode.SUBTRACT)
    add(cut_extrude3_tool2.solids().sort_by(Axis((68.626647, 26, -8.242641), (0, 0, 1)))[0], mode=Mode.SUBTRACT)
    add(cut_extrude3_tool3.solids().sort_by(Axis((68.626647, 6, -8.242641), (0, 0, 1)))[0], mode=Mode.SUBTRACT)


solid = part.part
